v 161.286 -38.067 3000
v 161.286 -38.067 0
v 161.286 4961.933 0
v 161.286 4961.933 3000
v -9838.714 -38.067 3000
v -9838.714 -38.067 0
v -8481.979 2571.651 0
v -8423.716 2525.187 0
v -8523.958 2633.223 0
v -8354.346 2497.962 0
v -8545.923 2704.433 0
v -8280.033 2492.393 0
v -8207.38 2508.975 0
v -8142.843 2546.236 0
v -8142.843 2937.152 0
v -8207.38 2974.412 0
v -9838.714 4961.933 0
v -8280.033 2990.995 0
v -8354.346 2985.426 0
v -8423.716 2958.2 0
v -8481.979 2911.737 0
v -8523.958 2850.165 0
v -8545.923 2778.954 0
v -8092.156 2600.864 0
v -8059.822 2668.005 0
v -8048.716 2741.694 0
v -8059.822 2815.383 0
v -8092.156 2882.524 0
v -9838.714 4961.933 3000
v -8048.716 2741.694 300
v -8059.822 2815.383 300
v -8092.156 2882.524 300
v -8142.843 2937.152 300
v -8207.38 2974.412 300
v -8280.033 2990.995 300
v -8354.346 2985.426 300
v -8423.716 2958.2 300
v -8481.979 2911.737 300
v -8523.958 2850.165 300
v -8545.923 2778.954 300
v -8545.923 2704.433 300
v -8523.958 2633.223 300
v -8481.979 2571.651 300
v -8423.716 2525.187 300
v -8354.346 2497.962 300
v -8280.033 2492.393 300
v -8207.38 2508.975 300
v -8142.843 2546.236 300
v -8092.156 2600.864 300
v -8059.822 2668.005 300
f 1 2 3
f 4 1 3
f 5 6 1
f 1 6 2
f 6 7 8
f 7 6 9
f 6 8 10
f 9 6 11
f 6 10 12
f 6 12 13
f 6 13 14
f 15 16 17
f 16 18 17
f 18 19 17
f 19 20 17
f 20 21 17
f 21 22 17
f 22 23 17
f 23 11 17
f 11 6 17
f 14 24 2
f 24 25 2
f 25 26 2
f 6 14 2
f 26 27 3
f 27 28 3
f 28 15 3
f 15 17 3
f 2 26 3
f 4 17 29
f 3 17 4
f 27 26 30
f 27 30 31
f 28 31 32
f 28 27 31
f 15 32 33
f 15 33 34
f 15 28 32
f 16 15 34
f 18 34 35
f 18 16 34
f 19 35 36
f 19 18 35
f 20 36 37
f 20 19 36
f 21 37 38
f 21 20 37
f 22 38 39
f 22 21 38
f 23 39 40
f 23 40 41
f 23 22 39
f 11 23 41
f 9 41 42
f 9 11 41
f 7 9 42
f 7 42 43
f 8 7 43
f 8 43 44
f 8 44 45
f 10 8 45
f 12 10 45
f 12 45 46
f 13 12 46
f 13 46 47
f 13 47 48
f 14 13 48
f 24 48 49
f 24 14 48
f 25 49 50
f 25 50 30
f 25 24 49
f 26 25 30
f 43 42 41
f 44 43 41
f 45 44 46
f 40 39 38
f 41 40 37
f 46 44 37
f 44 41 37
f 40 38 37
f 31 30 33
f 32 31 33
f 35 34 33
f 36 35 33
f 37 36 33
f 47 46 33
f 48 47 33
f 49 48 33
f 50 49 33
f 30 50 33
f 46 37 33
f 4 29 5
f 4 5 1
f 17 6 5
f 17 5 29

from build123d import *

# Parameters (mm, degrees)
F0_W     = 10000
F0_H     = 5000
F0_R     = 250
F1_DEPTH = 3000
F2_DEPTH = 300


with BuildPart() as f1:
    # F0 (on Top) → F1 (new body)
    with BuildSketch(Plane.XY):
        with Locations((-4838.713929, 2461.932909)):
            Rectangle(F0_W, F0_H)
        with Locations((-8298.715591, 2741.693735)):
            Circle(F0_R, mode=Mode.SUBTRACT)
        with Locations((-8298.715591, 2741.693735)):
            Circle(F0_R)
    extrude(amount=F1_DEPTH)

    # F0 (on Top) → F2 (cut)
    with BuildSketch(Plane.XY):
        with Locations((-8298.715591, 2741.693735)):
            Circle(F0_R)
    extrude(amount=F2_DEPTH, mode=Mode.SUBTRACT)


solid = f1.part
